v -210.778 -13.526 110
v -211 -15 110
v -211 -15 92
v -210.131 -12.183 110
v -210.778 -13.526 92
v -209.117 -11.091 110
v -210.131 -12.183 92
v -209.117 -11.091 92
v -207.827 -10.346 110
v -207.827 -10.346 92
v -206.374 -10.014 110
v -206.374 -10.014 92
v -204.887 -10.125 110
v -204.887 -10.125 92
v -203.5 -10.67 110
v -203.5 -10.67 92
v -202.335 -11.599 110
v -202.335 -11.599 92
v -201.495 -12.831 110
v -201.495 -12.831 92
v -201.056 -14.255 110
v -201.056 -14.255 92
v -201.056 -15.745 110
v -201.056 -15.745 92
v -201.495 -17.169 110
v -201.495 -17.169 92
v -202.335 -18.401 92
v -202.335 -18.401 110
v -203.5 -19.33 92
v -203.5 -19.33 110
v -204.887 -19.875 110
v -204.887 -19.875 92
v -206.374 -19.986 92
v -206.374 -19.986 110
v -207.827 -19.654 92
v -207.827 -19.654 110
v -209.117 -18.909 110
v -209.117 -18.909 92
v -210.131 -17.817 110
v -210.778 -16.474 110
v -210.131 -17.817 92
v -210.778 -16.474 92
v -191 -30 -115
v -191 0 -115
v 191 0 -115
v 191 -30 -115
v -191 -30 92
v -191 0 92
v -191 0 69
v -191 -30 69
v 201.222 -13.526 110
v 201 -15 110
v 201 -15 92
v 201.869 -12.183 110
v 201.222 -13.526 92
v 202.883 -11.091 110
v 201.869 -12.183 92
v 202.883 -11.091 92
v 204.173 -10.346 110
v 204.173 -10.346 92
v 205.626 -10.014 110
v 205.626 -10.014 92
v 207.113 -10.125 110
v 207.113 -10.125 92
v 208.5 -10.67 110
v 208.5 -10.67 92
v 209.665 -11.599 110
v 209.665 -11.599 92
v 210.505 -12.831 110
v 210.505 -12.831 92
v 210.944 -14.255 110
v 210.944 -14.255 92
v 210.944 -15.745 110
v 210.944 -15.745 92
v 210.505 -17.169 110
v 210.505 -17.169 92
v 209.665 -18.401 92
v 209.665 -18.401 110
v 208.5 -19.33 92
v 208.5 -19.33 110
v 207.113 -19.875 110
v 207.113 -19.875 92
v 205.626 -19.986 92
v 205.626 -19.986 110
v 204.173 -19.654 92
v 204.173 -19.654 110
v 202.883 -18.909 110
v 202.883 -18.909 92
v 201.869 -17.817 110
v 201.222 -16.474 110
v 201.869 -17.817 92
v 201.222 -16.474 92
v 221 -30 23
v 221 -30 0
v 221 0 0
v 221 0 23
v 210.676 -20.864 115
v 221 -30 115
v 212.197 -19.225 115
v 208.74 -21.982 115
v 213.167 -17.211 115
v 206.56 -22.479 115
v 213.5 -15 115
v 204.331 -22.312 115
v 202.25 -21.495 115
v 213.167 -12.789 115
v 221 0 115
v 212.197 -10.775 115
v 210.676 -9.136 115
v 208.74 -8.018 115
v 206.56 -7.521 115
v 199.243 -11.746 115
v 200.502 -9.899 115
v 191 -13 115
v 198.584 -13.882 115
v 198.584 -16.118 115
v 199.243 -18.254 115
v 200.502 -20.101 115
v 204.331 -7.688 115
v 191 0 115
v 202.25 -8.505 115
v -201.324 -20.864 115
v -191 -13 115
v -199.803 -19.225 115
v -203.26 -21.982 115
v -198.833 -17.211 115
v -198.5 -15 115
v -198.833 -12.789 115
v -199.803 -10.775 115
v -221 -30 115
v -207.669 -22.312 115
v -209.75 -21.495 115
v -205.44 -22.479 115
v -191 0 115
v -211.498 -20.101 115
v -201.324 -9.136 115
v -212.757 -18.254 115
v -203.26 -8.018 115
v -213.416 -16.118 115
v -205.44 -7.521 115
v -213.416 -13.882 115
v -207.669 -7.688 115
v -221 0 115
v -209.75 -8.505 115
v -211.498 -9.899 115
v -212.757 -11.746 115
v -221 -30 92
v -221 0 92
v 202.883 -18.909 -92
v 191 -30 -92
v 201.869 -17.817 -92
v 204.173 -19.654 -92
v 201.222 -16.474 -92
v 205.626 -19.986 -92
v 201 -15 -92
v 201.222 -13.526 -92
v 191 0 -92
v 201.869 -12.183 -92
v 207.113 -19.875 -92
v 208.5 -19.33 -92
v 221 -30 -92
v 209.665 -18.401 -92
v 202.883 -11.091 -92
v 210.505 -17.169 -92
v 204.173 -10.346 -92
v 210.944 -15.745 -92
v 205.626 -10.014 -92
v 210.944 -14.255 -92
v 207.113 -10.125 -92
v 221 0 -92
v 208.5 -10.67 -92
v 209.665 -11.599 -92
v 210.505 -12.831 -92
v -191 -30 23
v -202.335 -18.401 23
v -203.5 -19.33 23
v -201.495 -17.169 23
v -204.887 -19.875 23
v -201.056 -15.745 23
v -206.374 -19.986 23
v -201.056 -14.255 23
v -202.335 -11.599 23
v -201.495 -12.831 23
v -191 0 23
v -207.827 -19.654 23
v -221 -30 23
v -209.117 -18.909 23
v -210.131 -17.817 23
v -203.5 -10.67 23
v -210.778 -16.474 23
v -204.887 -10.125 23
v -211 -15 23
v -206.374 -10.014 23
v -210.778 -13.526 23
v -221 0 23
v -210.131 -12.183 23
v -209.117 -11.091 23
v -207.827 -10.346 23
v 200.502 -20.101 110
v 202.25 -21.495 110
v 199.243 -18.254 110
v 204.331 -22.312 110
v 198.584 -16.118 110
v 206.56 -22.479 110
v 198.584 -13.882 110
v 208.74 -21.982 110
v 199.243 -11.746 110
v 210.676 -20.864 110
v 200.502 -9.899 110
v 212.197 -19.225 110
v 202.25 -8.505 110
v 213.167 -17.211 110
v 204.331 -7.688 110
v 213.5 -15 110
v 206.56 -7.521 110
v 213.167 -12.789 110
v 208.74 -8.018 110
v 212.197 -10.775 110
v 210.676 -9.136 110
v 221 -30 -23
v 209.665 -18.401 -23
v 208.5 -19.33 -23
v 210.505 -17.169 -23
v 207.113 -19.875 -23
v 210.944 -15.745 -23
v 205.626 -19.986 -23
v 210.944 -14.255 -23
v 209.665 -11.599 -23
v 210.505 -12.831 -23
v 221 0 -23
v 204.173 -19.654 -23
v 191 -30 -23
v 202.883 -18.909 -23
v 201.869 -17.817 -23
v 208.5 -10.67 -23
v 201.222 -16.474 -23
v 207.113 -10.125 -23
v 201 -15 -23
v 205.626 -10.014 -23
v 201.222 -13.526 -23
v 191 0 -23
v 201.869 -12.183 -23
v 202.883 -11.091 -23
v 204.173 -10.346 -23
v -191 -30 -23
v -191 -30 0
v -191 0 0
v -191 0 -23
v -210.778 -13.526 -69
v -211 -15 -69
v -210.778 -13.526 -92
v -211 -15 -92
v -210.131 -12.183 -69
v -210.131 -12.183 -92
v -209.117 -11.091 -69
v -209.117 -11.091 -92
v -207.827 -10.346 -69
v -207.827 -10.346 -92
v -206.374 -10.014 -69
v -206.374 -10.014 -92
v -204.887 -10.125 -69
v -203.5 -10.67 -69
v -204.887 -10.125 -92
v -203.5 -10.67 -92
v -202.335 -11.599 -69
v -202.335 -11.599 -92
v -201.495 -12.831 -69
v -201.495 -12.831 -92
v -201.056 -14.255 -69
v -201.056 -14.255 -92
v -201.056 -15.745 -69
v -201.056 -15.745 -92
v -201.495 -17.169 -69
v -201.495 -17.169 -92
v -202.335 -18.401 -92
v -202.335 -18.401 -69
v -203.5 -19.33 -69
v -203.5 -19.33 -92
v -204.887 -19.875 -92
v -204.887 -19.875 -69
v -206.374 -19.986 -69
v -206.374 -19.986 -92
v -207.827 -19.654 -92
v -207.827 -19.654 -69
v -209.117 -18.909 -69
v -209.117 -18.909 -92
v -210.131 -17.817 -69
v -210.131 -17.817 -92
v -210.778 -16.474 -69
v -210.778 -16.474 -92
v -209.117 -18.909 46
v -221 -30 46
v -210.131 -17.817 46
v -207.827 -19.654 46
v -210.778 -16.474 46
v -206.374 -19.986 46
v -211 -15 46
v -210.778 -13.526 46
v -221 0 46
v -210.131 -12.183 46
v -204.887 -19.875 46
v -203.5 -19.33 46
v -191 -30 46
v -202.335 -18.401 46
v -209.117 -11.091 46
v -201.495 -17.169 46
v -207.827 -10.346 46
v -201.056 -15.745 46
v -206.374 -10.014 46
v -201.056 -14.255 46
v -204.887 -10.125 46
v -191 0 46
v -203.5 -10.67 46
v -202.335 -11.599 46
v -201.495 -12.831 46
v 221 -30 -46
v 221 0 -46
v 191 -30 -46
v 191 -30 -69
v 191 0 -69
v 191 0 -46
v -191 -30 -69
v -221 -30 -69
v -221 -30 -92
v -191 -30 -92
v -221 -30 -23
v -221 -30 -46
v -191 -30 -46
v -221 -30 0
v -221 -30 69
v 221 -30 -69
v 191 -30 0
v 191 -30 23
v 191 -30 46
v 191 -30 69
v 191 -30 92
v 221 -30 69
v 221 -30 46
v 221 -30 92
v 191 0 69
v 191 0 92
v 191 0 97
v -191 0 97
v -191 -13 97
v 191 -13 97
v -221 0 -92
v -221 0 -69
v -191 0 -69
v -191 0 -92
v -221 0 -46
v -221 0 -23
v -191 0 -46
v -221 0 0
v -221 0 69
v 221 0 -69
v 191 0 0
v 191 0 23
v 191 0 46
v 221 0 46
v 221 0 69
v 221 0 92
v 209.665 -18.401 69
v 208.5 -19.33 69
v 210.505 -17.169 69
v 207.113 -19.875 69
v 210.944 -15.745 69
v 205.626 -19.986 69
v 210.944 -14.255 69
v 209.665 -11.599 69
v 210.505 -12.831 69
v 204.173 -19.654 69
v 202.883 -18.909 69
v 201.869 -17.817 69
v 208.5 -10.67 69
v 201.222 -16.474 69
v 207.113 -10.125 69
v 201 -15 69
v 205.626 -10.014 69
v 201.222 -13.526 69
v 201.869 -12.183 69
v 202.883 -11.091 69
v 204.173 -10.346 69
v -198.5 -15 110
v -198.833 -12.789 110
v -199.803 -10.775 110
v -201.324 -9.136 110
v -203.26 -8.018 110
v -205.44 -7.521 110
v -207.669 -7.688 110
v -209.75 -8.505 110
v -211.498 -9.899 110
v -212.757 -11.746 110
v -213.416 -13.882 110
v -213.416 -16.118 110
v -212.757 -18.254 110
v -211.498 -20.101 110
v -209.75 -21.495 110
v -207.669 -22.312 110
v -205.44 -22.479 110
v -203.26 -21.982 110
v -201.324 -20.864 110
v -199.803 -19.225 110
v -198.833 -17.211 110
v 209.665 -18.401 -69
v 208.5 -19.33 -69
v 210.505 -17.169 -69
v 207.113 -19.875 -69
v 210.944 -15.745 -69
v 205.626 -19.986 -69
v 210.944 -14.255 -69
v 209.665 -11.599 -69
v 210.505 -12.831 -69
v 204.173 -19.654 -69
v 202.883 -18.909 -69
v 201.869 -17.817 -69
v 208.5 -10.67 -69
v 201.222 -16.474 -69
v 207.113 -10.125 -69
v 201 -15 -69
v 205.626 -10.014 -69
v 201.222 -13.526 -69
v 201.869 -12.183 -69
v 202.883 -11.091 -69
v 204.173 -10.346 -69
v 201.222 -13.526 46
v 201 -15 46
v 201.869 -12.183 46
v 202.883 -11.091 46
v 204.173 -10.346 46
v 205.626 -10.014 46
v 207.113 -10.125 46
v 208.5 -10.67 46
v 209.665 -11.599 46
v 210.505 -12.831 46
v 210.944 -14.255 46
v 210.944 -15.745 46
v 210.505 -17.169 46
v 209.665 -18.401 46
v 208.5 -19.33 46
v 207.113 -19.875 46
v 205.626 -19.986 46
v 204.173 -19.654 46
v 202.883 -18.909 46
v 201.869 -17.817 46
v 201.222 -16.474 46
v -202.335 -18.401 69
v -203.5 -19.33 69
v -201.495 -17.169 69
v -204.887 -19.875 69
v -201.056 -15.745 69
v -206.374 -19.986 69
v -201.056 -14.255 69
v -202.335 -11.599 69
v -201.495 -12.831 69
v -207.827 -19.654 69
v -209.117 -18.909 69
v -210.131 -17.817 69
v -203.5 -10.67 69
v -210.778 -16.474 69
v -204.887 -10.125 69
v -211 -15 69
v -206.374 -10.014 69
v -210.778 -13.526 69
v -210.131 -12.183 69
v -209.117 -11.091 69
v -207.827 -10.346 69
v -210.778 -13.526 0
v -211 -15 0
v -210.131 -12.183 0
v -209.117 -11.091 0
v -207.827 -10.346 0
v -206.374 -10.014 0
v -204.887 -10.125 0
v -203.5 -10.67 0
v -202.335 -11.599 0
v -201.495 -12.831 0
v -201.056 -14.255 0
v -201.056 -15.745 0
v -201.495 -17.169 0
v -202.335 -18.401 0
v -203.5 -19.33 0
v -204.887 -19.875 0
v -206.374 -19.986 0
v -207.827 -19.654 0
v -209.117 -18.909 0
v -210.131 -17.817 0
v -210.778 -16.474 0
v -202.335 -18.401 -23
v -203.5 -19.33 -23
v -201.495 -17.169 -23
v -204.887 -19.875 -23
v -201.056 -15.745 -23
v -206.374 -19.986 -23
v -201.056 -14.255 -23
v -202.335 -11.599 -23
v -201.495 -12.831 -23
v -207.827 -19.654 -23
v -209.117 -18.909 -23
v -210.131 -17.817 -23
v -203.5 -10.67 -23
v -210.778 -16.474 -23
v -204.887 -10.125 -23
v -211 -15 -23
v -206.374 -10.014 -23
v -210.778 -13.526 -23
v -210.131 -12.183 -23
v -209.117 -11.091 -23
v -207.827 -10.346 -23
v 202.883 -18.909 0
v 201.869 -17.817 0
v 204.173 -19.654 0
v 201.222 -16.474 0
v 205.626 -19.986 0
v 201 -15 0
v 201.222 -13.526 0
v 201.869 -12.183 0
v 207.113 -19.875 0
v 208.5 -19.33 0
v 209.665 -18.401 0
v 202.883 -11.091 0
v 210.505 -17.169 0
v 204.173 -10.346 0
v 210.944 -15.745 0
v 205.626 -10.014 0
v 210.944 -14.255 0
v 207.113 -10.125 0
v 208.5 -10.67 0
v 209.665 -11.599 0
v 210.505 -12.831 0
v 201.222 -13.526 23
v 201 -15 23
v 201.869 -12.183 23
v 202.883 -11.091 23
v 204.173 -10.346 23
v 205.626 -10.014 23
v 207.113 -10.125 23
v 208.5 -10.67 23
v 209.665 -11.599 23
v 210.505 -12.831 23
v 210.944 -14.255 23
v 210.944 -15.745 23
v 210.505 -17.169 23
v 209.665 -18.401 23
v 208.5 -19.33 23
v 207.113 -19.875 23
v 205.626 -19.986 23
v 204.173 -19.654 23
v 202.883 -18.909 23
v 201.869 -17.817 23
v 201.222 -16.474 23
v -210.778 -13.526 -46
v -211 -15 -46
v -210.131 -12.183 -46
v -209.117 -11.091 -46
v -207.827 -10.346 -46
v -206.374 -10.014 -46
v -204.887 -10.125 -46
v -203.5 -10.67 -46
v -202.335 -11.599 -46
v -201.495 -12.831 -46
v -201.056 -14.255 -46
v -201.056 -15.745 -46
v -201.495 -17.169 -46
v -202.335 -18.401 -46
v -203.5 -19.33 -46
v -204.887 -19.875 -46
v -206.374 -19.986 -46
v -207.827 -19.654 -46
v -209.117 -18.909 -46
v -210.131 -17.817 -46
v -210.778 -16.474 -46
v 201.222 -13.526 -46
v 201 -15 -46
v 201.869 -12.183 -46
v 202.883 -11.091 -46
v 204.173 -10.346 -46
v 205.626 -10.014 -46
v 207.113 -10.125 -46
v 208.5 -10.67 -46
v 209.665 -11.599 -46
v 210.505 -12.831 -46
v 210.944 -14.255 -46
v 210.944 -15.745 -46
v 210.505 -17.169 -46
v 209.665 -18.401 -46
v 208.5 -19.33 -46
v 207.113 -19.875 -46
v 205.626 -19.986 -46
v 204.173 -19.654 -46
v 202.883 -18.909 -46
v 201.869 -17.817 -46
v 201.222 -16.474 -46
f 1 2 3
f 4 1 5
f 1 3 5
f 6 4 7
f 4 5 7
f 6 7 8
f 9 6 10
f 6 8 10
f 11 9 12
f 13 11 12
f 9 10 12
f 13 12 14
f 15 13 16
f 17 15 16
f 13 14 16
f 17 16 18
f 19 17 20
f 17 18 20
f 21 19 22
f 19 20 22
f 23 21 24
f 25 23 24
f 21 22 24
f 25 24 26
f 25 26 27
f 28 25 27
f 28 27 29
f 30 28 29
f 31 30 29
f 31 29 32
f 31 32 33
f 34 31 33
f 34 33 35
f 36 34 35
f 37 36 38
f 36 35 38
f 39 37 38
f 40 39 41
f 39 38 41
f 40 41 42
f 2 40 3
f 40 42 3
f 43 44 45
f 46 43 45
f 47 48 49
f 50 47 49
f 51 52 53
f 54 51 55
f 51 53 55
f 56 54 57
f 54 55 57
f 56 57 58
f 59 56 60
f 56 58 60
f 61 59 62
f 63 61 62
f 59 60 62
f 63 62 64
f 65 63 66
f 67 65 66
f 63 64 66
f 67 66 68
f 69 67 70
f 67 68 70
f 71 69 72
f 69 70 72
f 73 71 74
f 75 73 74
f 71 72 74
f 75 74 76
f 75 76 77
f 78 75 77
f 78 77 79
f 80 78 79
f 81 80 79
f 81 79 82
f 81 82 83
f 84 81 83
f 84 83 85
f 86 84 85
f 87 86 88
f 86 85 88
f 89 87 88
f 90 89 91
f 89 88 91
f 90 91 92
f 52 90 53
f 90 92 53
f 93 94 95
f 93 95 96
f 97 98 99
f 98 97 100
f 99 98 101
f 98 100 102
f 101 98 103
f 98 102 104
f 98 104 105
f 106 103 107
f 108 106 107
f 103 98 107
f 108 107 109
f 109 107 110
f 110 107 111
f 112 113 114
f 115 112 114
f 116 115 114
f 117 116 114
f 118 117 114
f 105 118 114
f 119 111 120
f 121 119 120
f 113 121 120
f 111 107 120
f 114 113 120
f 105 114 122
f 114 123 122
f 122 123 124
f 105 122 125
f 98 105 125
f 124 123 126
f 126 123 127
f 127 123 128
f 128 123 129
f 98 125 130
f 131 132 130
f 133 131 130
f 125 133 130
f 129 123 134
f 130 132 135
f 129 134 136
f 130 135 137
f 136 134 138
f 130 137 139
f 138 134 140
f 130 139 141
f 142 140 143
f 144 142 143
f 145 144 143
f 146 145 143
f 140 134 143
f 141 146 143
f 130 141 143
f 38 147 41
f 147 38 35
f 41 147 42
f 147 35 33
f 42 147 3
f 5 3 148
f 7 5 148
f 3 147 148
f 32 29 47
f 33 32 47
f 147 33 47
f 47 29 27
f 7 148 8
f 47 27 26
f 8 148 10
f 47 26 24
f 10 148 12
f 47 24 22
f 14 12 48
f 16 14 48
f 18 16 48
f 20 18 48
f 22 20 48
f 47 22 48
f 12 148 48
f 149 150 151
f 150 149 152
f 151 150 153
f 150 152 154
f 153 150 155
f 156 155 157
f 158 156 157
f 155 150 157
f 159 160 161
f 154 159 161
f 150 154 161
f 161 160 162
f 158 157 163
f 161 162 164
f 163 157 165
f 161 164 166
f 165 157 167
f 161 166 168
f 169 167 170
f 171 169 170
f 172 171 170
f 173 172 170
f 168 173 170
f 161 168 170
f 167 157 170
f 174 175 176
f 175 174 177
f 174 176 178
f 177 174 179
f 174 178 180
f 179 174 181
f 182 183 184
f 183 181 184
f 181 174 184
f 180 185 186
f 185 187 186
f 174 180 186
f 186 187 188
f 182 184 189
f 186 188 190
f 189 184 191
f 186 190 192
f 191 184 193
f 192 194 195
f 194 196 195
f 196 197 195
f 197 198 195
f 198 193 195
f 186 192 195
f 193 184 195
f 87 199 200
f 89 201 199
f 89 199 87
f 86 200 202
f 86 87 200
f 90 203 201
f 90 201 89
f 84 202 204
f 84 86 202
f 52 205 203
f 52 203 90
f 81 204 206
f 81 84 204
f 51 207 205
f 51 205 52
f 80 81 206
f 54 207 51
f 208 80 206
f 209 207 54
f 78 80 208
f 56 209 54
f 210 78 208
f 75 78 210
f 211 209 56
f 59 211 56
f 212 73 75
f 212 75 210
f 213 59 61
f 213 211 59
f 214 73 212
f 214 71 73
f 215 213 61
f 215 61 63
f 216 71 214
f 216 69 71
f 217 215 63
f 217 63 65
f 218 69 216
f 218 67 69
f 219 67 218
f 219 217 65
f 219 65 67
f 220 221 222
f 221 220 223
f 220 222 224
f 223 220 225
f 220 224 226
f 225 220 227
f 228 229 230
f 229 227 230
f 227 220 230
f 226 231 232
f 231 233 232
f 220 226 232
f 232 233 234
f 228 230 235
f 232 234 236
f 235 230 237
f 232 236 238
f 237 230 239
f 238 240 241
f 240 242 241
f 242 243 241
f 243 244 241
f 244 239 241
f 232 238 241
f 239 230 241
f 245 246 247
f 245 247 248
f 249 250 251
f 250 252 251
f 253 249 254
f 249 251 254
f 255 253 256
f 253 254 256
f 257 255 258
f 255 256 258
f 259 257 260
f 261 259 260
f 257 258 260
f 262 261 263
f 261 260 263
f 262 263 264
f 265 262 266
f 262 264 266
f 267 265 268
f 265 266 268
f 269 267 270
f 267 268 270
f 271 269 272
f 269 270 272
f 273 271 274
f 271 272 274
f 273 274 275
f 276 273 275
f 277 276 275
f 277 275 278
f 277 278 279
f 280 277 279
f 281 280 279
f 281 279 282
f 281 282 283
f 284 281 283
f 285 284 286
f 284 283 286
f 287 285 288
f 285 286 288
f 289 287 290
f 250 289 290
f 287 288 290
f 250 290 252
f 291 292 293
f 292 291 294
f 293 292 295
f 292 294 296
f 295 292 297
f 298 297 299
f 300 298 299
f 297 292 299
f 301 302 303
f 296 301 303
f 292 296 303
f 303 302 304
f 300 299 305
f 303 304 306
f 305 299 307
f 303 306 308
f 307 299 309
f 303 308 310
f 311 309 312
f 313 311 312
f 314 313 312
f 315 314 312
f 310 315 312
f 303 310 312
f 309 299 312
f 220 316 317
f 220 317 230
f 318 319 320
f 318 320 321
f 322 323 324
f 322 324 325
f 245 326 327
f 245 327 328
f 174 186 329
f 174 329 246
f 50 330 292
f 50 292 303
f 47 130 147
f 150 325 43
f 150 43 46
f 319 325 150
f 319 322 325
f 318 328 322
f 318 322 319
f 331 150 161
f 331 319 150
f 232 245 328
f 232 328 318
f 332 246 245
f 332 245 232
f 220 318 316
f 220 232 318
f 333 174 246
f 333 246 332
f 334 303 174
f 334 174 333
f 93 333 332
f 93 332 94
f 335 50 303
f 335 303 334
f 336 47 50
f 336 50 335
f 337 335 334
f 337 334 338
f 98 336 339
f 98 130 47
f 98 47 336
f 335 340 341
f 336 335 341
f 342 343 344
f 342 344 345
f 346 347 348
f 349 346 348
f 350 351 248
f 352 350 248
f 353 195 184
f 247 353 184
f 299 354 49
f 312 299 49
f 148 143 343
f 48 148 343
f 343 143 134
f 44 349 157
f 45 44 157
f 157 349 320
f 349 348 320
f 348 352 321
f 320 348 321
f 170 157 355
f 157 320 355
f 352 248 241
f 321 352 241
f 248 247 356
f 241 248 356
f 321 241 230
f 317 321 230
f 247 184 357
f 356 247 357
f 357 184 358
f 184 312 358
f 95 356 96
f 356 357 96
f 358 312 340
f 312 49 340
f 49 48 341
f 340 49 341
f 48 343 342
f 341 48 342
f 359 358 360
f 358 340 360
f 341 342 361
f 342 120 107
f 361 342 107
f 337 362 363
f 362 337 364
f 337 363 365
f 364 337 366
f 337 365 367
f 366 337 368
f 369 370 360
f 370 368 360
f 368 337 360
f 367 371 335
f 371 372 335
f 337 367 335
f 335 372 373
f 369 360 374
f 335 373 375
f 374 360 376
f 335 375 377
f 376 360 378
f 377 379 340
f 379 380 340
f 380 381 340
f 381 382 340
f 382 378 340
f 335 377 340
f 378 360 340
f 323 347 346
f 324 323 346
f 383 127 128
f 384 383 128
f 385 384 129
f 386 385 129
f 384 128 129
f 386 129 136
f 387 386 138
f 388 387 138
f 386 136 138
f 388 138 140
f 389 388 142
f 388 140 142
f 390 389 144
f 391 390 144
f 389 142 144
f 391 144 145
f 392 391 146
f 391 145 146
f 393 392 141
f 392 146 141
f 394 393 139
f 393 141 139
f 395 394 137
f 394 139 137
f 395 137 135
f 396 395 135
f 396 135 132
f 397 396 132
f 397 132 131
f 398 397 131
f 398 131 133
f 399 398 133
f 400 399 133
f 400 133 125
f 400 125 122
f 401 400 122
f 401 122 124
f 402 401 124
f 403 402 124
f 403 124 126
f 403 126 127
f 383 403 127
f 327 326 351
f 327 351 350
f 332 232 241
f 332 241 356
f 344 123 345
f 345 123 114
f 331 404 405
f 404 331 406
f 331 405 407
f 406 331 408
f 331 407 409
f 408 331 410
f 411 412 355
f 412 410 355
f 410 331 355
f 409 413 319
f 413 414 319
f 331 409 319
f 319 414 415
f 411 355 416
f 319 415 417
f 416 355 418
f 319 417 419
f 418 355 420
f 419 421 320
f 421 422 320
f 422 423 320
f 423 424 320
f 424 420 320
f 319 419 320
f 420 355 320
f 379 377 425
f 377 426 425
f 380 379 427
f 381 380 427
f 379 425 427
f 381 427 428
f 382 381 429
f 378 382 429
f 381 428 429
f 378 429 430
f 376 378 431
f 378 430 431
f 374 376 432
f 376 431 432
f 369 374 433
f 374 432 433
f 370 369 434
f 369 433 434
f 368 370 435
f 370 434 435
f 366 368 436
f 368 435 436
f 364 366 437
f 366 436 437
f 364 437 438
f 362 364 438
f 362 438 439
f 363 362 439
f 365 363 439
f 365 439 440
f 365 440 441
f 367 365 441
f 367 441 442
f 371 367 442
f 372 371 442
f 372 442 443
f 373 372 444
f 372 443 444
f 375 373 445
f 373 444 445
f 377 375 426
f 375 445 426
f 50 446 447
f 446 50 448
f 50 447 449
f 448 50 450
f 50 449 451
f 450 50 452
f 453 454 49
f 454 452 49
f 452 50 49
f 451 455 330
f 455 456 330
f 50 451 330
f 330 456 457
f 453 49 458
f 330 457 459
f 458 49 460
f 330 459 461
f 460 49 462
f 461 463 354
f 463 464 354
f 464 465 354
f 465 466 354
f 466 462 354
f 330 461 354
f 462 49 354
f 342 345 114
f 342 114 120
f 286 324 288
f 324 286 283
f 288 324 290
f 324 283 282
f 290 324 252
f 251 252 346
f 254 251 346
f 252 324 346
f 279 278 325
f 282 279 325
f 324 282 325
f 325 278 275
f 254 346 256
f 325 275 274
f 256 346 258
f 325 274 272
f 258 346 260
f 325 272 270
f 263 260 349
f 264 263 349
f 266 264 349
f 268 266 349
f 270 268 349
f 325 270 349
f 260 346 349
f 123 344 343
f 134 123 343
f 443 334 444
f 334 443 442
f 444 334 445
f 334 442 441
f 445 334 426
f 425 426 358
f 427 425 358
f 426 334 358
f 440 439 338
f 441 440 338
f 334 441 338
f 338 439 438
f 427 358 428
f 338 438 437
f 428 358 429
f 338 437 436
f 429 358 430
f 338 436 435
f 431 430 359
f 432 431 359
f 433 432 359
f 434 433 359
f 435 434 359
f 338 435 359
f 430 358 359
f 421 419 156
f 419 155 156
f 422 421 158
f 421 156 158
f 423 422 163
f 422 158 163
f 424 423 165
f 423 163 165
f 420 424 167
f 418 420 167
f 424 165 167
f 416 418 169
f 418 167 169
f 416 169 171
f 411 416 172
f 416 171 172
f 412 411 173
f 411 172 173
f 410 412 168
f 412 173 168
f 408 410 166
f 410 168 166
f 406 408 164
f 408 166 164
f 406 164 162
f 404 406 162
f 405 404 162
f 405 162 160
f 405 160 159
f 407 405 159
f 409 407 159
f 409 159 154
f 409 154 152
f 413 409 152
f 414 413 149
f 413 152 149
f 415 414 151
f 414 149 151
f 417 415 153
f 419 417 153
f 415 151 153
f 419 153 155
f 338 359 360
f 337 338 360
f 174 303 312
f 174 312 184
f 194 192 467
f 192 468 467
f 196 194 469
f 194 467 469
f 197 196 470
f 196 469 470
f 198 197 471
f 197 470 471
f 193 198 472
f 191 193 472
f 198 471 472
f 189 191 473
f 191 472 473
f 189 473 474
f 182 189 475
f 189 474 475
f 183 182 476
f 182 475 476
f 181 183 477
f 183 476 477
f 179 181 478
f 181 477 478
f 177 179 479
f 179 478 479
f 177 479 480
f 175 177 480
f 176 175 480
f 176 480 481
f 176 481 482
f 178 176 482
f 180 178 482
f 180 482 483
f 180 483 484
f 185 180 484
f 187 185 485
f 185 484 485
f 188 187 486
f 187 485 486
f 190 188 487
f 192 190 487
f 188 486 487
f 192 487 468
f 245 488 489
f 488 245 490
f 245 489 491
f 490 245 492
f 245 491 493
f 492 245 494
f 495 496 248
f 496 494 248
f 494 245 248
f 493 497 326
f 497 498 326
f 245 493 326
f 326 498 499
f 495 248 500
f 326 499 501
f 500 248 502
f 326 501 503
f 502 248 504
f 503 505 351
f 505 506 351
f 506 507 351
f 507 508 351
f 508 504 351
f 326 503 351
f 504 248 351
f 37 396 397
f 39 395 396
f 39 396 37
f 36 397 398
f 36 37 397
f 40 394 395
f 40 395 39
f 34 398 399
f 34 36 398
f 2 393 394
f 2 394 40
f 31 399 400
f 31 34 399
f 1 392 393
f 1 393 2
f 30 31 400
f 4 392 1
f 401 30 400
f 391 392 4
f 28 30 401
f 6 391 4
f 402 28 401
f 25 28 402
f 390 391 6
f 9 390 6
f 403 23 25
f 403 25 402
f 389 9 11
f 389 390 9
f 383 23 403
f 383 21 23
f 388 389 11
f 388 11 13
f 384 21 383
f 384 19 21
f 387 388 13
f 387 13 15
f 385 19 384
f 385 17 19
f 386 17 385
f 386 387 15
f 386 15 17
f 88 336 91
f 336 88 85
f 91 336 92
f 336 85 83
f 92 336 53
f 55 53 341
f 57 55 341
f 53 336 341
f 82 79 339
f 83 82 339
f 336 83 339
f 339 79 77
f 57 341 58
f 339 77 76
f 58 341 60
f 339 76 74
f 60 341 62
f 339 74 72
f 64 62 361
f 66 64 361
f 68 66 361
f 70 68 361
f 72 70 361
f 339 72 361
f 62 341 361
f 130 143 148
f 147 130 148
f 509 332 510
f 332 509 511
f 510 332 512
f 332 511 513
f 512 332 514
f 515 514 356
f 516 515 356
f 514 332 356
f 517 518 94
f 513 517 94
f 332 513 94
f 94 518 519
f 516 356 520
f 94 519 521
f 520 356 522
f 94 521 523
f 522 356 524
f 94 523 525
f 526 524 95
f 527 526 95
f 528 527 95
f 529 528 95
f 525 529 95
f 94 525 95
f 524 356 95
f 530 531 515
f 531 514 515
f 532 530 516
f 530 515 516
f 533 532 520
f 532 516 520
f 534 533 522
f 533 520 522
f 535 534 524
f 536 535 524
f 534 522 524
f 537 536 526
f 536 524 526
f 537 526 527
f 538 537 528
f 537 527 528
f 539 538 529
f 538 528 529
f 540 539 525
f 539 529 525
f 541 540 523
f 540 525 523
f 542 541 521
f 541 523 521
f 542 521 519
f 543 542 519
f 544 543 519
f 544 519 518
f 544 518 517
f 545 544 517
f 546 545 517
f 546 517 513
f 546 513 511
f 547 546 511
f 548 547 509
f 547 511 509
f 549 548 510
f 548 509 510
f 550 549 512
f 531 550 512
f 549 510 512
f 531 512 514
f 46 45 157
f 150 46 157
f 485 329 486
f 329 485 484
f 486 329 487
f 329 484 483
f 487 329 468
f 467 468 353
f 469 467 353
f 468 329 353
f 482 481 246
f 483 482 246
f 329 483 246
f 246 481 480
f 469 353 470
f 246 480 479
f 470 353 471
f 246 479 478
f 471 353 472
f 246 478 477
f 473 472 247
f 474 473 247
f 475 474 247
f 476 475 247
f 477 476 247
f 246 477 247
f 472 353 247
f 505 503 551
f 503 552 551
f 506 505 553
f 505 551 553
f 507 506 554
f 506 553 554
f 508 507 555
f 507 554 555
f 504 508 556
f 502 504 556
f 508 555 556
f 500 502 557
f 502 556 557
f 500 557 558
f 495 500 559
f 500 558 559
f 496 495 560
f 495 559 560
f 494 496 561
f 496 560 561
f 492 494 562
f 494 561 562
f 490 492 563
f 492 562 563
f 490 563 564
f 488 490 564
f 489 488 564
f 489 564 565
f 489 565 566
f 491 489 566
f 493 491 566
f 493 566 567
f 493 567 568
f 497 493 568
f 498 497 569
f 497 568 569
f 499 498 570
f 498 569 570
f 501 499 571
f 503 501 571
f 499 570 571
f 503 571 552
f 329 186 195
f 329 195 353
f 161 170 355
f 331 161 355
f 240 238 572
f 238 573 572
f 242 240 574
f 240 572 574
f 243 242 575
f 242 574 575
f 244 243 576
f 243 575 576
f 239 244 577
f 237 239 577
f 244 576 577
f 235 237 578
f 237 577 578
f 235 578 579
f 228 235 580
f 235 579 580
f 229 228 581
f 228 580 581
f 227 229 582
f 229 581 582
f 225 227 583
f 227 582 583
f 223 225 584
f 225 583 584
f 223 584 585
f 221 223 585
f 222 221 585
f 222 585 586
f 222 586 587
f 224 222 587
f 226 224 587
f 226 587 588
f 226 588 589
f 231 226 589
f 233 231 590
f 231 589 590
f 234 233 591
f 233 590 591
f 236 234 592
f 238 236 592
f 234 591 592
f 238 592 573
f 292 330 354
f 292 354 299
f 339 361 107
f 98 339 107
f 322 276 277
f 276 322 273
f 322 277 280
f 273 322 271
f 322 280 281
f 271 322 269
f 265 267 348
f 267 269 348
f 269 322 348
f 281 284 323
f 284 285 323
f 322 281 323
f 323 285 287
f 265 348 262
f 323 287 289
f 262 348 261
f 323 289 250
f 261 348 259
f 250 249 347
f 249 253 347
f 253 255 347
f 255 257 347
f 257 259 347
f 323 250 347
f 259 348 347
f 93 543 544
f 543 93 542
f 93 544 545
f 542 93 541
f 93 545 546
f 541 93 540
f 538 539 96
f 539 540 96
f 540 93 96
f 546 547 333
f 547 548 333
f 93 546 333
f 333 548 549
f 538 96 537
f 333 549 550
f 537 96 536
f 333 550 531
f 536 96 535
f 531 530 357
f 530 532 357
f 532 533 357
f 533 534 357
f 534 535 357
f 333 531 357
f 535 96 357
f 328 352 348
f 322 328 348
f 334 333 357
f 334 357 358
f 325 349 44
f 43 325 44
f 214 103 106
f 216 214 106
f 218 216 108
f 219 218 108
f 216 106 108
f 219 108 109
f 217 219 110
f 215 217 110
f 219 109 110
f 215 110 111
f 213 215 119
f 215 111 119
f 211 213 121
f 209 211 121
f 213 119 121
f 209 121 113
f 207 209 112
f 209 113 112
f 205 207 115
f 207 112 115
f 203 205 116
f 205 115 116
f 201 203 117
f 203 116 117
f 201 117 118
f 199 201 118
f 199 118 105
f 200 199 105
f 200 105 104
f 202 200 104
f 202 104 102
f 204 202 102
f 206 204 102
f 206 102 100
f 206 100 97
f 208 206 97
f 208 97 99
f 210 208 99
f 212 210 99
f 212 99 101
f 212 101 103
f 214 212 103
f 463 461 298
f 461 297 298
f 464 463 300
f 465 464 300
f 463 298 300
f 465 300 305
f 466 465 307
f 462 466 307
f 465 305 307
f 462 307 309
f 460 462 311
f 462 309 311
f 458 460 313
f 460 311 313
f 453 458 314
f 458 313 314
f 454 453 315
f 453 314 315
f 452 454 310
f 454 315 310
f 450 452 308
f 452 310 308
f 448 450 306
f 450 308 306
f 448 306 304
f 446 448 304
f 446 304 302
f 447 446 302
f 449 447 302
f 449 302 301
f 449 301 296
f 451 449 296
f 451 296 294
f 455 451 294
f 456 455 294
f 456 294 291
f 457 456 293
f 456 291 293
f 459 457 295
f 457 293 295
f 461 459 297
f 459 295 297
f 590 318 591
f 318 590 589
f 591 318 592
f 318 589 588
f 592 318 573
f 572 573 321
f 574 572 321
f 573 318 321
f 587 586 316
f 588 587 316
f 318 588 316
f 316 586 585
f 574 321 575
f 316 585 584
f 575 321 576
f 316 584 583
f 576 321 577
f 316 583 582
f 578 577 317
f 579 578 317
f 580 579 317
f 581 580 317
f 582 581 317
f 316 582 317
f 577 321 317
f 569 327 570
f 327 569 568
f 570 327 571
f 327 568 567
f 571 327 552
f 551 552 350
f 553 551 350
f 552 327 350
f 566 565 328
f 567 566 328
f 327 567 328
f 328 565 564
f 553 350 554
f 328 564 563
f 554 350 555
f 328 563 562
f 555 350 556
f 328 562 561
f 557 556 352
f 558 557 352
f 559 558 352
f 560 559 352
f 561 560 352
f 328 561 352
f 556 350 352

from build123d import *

# Parameters (mm, degrees)
F1_DEPTH       = 30
F3_D           = 10
F3_CBORE_D     = 15
F3_CBORE_DEPTH = 5
F2_W           = 382
F2_H           = 13
F4_DEPTH       = 18


with BuildPart() as f1:
    # F0 (on Front) → F1 (new body)
    with BuildSketch(Plane.XZ):
        Polygon((221, 92), (221, 115), (-221, 115), (-221, 92), (-191, 92), (-191, 69), (-221, 69), (-221, 46), (-191, 46), (-191, 23), (-221, 23), (-221, 0), (-191, 0), (-191, -23), (-221, -23), (-221, -46), (-191, -46), (-191, -69), (-221, -69), (-221, -92), (-191, -92), (-191, -115), (191, -115), (191, -92), (221, -92), (221, -69), (191, -69), (191, -46), (221, -46), (221, -23), (191, -23), (191, 0), (221, 0), (221, 23), (191, 23), (191, 46), (221, 46), (221, 69), (191, 69), (191, 92), align=None)
    extrude(amount=F1_DEPTH)

    # F3 (through all)
    with Locations(Plane.XY.offset(115)):
        with Locations((-206, -15), (206, -15)):
            CounterBoreHole(F3_D / 2, F3_CBORE_D / 2, F3_CBORE_DEPTH)

    # F2 (on face) → F4 (cut)
    with BuildSketch(Plane.XY.offset(115)):
        with Locations((0, -6.5)):
            Rectangle(F2_W, F2_H)
    extrude(amount=-F4_DEPTH, mode=Mode.SUBTRACT)


solid = f1.part
